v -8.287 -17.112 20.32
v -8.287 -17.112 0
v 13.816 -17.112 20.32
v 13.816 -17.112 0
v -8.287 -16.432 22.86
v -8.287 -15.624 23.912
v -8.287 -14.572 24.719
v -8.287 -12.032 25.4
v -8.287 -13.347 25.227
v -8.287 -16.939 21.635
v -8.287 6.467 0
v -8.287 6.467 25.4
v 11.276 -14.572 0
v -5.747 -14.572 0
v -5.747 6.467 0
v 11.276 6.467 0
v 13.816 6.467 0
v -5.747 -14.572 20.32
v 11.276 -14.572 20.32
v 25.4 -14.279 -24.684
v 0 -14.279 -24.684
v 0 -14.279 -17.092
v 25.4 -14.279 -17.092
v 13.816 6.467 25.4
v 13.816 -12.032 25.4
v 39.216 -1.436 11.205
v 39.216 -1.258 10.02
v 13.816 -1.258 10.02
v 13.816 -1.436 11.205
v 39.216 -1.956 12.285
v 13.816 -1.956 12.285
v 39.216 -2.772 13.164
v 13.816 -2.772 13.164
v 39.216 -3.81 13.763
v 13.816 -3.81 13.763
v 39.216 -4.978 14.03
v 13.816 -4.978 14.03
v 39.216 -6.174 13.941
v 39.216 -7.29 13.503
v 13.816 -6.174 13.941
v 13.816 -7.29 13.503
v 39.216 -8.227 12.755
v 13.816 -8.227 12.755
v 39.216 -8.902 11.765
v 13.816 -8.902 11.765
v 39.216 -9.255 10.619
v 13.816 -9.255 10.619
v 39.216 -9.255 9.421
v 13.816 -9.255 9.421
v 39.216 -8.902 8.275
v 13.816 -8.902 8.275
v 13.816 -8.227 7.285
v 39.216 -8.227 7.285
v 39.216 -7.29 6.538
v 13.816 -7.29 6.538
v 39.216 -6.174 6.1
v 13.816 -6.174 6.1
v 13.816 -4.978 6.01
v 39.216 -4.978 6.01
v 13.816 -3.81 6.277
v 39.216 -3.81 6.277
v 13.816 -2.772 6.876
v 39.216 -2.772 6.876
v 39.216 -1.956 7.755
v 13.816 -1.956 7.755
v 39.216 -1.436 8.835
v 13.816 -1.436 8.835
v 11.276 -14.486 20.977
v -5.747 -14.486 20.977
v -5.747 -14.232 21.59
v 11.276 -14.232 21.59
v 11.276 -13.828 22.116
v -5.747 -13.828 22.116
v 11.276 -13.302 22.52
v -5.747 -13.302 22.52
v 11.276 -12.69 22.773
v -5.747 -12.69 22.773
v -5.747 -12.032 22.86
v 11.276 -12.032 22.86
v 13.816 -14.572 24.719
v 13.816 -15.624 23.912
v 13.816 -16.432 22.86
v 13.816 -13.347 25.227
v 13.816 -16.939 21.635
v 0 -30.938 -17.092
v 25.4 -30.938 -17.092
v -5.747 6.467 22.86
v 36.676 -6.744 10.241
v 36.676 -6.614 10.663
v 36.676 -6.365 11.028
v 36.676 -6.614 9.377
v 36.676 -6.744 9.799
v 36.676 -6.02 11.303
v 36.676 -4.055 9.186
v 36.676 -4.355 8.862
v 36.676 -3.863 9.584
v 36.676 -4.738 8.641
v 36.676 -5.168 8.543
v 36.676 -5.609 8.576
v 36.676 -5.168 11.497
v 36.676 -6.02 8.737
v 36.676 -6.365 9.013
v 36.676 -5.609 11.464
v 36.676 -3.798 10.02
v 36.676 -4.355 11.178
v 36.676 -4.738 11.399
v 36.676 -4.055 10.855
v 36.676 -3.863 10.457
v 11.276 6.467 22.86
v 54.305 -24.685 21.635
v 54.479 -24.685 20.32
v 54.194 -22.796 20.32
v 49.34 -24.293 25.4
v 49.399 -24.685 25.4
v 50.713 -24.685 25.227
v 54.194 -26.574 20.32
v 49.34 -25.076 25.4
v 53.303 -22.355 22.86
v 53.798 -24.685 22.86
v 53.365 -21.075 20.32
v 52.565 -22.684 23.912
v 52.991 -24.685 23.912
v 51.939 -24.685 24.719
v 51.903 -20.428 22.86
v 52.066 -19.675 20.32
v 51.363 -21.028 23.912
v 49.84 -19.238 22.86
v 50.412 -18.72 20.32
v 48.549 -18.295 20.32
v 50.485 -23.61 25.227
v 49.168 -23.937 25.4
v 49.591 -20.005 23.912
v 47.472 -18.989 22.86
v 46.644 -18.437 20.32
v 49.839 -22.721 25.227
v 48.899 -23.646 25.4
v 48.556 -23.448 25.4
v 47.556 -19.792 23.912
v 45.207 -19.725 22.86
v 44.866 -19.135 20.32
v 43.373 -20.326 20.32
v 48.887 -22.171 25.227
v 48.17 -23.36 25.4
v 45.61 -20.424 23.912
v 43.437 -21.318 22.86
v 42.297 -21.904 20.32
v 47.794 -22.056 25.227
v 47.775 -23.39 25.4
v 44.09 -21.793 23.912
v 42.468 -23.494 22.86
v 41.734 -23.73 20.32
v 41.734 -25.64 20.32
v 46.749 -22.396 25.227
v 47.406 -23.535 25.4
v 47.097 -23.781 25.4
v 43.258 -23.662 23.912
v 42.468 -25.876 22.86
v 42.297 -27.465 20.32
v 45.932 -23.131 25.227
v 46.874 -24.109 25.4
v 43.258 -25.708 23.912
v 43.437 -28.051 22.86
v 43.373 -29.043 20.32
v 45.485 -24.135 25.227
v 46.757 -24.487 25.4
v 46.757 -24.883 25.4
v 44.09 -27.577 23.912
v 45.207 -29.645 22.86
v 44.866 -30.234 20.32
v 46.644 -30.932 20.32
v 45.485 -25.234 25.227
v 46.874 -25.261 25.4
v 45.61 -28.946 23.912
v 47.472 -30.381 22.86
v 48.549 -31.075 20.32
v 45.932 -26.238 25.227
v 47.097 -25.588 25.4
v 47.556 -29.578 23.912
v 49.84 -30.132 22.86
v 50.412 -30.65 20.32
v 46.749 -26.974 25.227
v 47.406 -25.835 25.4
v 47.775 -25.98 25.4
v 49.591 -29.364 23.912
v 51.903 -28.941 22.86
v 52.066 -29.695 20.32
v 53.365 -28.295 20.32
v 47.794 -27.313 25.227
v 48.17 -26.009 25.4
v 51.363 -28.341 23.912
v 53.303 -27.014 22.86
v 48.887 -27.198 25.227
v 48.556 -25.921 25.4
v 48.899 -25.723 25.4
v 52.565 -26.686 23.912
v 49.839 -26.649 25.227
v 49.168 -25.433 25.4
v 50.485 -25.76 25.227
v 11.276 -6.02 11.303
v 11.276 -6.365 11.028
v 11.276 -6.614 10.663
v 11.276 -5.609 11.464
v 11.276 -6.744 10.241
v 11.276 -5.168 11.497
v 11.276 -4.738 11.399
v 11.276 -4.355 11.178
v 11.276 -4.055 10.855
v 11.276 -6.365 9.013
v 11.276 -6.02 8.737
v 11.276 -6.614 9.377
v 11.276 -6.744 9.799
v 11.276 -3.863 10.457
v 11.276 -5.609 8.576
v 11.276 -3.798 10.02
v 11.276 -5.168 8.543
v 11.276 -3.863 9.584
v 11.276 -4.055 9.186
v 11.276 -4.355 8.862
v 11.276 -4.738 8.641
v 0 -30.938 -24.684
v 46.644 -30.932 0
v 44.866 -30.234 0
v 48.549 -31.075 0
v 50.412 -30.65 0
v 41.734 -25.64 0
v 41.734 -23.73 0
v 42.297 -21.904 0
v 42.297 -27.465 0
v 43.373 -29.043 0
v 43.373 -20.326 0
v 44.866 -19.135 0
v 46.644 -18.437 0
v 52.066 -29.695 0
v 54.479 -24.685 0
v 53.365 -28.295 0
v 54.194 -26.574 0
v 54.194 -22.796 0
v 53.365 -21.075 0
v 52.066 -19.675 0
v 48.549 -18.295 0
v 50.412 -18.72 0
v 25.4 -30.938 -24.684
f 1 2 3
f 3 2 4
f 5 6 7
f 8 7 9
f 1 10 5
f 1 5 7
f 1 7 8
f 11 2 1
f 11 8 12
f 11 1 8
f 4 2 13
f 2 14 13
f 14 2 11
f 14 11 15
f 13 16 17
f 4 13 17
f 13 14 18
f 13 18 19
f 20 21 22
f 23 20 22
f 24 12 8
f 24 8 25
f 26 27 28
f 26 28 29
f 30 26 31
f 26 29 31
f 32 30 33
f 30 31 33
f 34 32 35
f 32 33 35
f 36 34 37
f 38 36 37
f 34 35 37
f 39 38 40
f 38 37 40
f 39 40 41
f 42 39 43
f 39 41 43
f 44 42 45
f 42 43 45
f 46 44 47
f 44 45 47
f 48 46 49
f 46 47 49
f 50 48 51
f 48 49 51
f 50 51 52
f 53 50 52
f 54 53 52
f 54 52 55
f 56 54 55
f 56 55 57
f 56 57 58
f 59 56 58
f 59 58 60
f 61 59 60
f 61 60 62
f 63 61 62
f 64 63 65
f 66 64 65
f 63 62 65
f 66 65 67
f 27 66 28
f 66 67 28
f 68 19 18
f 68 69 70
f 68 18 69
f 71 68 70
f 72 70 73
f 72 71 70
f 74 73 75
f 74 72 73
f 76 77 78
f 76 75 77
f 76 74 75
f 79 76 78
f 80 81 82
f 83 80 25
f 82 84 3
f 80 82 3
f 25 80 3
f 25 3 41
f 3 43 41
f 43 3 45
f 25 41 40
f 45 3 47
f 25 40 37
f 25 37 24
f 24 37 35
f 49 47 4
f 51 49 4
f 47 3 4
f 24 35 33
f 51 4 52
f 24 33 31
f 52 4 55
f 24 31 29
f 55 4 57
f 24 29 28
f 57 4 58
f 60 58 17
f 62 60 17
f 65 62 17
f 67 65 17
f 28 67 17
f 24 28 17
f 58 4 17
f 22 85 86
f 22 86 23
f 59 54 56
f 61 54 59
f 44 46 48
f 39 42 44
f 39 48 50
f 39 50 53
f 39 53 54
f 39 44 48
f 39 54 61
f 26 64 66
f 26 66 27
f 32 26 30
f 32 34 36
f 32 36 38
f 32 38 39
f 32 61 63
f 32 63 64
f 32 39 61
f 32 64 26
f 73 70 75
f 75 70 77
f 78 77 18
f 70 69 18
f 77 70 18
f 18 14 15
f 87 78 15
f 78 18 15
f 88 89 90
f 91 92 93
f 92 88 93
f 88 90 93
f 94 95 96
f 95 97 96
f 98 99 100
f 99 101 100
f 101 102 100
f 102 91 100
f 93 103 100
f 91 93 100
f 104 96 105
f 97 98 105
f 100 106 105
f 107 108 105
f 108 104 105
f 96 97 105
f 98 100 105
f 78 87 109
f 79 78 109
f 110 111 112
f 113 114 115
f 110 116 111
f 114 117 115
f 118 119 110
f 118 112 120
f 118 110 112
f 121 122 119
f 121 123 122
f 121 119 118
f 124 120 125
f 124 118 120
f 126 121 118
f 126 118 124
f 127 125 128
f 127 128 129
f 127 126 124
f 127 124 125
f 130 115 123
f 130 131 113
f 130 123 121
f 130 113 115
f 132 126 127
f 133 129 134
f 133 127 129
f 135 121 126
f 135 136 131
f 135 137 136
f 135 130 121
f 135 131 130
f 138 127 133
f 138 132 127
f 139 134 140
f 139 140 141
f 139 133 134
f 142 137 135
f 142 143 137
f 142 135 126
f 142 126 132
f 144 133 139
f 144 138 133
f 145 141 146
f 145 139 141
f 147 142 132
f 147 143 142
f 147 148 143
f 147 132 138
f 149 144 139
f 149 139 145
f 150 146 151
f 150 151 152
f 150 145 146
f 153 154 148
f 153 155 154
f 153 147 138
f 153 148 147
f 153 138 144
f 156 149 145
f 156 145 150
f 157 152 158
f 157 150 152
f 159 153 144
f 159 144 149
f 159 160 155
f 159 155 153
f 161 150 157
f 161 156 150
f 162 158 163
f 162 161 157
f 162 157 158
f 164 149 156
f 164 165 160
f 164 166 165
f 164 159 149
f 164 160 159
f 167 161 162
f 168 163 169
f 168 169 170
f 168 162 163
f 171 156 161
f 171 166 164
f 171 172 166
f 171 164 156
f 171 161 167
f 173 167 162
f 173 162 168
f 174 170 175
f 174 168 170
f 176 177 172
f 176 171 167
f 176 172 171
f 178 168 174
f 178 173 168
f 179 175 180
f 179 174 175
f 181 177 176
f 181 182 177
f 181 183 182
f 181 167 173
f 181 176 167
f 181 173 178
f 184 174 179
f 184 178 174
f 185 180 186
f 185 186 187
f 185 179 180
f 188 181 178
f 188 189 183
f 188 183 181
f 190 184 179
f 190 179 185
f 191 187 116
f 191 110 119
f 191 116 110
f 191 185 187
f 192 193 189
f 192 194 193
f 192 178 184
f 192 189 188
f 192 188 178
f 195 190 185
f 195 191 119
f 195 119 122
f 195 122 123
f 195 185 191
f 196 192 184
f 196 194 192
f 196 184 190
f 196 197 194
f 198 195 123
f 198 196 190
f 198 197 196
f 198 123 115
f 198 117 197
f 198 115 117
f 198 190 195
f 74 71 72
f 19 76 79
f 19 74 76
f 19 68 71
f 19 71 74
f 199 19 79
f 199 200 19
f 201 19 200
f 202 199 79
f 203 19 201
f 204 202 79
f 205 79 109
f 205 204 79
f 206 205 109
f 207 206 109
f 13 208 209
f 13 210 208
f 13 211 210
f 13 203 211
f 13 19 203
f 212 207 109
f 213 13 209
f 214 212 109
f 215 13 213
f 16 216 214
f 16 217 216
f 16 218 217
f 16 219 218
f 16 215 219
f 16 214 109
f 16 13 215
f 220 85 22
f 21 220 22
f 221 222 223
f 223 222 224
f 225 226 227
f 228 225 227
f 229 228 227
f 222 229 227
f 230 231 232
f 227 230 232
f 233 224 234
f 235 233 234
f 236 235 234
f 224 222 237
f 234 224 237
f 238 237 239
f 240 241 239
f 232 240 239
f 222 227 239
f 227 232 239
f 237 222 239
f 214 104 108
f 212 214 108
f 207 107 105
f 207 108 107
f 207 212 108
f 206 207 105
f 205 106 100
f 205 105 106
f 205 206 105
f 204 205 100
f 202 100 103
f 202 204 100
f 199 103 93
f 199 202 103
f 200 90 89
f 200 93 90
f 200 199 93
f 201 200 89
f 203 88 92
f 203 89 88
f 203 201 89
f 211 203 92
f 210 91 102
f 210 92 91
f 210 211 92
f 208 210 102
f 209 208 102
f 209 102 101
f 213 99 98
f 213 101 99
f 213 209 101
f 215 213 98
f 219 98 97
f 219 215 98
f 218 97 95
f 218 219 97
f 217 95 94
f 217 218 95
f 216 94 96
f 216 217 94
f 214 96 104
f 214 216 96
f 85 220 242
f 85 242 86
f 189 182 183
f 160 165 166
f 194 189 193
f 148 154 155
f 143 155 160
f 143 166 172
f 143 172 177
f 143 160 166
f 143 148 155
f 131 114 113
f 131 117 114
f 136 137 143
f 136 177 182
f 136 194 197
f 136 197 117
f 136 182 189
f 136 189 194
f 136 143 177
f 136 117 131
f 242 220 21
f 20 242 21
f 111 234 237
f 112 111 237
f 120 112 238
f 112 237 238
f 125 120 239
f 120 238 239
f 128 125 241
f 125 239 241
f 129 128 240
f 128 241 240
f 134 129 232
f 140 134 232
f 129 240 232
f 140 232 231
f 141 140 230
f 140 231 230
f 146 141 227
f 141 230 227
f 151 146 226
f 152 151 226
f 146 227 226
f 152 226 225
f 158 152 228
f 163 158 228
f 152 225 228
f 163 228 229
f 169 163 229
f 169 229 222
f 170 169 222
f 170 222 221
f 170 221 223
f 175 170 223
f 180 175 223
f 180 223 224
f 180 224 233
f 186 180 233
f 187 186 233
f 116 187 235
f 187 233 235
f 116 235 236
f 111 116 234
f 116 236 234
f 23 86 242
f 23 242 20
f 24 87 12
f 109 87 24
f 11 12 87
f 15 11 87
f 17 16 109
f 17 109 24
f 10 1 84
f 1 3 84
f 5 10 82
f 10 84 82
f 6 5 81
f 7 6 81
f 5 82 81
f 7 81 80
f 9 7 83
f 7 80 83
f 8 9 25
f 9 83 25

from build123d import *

# Parameters (mm, degrees)
F0_W      = 22.1026940271
F0_H      = 23.578889668
F1_DEPTH  = 25.4
F3_R      = 6.4081538326
F4_DEPTH  = 25.4
F5_R      = 5.08
F5_2_R    = 5.08
F6_R      = 4.0212899702
F7_DEPTH  = 25.4
F8_T      = -2.54
F9_W      = 16.6588872671
F9_H      = 7.5919292867
F10_DEPTH = 25.4


with BuildPart() as f1:
    # F0 (on Top) → F1 (new body)
    with BuildSketch(Plane.XY):
        with Locations((2.7647218667, -5.3227283061)):
            Rectangle(F0_W, F0_H)
    extrude(amount=F1_DEPTH)

    # F5
    f5_edges = [f1.edges().sort_by_distance(p)[0] for p in [
        (2.764722, -17.112173, 25.4),
    ]]
    fillet(f5_edges, radius=F5_R)

    # F6 (on face) → F7 (join)
    with BuildSketch(Plane.YZ.offset(13.8160688803)):
        with Locations((-5.2789159967, 10.0201541813)):
            Circle(F6_R)
    extrude(amount=F7_DEPTH)

    # F8
    f8_openings = [f1.faces().sort_by_distance(p)[0] for p in [
        (2.764722, -5.322728, 0),
        (2.764722, 6.466717, 12.7),
    ]]
    offset(amount=F8_T, openings=f8_openings, kind=Kind.INTERSECTION)


with BuildPart() as f4:
    # F3 (on Top) → F4 (new body)
    with BuildSketch(Plane.XY):
        with Locations((48.0704158545, -24.6848165989)):
            Circle(F3_R)
    extrude(amount=F4_DEPTH)

    # F5#2
    f5_2_edges = [f4.edges().sort_by_distance(p)[0] for p in [
        (41.662262, -24.684817, 25.4),
    ]]
    fillet(f5_2_edges, radius=F5_2_R)


with BuildPart() as f10:
    # F9 (on Right) → F10 (new body)
    with BuildSketch(Plane.YZ):
        with Locations((-22.6085111499, -20.8875481039)):
            Rectangle(F9_W, F9_H)
    extrude(amount=F10_DEPTH)


solid = Compound([f1.part, f4.part, f10.part])
